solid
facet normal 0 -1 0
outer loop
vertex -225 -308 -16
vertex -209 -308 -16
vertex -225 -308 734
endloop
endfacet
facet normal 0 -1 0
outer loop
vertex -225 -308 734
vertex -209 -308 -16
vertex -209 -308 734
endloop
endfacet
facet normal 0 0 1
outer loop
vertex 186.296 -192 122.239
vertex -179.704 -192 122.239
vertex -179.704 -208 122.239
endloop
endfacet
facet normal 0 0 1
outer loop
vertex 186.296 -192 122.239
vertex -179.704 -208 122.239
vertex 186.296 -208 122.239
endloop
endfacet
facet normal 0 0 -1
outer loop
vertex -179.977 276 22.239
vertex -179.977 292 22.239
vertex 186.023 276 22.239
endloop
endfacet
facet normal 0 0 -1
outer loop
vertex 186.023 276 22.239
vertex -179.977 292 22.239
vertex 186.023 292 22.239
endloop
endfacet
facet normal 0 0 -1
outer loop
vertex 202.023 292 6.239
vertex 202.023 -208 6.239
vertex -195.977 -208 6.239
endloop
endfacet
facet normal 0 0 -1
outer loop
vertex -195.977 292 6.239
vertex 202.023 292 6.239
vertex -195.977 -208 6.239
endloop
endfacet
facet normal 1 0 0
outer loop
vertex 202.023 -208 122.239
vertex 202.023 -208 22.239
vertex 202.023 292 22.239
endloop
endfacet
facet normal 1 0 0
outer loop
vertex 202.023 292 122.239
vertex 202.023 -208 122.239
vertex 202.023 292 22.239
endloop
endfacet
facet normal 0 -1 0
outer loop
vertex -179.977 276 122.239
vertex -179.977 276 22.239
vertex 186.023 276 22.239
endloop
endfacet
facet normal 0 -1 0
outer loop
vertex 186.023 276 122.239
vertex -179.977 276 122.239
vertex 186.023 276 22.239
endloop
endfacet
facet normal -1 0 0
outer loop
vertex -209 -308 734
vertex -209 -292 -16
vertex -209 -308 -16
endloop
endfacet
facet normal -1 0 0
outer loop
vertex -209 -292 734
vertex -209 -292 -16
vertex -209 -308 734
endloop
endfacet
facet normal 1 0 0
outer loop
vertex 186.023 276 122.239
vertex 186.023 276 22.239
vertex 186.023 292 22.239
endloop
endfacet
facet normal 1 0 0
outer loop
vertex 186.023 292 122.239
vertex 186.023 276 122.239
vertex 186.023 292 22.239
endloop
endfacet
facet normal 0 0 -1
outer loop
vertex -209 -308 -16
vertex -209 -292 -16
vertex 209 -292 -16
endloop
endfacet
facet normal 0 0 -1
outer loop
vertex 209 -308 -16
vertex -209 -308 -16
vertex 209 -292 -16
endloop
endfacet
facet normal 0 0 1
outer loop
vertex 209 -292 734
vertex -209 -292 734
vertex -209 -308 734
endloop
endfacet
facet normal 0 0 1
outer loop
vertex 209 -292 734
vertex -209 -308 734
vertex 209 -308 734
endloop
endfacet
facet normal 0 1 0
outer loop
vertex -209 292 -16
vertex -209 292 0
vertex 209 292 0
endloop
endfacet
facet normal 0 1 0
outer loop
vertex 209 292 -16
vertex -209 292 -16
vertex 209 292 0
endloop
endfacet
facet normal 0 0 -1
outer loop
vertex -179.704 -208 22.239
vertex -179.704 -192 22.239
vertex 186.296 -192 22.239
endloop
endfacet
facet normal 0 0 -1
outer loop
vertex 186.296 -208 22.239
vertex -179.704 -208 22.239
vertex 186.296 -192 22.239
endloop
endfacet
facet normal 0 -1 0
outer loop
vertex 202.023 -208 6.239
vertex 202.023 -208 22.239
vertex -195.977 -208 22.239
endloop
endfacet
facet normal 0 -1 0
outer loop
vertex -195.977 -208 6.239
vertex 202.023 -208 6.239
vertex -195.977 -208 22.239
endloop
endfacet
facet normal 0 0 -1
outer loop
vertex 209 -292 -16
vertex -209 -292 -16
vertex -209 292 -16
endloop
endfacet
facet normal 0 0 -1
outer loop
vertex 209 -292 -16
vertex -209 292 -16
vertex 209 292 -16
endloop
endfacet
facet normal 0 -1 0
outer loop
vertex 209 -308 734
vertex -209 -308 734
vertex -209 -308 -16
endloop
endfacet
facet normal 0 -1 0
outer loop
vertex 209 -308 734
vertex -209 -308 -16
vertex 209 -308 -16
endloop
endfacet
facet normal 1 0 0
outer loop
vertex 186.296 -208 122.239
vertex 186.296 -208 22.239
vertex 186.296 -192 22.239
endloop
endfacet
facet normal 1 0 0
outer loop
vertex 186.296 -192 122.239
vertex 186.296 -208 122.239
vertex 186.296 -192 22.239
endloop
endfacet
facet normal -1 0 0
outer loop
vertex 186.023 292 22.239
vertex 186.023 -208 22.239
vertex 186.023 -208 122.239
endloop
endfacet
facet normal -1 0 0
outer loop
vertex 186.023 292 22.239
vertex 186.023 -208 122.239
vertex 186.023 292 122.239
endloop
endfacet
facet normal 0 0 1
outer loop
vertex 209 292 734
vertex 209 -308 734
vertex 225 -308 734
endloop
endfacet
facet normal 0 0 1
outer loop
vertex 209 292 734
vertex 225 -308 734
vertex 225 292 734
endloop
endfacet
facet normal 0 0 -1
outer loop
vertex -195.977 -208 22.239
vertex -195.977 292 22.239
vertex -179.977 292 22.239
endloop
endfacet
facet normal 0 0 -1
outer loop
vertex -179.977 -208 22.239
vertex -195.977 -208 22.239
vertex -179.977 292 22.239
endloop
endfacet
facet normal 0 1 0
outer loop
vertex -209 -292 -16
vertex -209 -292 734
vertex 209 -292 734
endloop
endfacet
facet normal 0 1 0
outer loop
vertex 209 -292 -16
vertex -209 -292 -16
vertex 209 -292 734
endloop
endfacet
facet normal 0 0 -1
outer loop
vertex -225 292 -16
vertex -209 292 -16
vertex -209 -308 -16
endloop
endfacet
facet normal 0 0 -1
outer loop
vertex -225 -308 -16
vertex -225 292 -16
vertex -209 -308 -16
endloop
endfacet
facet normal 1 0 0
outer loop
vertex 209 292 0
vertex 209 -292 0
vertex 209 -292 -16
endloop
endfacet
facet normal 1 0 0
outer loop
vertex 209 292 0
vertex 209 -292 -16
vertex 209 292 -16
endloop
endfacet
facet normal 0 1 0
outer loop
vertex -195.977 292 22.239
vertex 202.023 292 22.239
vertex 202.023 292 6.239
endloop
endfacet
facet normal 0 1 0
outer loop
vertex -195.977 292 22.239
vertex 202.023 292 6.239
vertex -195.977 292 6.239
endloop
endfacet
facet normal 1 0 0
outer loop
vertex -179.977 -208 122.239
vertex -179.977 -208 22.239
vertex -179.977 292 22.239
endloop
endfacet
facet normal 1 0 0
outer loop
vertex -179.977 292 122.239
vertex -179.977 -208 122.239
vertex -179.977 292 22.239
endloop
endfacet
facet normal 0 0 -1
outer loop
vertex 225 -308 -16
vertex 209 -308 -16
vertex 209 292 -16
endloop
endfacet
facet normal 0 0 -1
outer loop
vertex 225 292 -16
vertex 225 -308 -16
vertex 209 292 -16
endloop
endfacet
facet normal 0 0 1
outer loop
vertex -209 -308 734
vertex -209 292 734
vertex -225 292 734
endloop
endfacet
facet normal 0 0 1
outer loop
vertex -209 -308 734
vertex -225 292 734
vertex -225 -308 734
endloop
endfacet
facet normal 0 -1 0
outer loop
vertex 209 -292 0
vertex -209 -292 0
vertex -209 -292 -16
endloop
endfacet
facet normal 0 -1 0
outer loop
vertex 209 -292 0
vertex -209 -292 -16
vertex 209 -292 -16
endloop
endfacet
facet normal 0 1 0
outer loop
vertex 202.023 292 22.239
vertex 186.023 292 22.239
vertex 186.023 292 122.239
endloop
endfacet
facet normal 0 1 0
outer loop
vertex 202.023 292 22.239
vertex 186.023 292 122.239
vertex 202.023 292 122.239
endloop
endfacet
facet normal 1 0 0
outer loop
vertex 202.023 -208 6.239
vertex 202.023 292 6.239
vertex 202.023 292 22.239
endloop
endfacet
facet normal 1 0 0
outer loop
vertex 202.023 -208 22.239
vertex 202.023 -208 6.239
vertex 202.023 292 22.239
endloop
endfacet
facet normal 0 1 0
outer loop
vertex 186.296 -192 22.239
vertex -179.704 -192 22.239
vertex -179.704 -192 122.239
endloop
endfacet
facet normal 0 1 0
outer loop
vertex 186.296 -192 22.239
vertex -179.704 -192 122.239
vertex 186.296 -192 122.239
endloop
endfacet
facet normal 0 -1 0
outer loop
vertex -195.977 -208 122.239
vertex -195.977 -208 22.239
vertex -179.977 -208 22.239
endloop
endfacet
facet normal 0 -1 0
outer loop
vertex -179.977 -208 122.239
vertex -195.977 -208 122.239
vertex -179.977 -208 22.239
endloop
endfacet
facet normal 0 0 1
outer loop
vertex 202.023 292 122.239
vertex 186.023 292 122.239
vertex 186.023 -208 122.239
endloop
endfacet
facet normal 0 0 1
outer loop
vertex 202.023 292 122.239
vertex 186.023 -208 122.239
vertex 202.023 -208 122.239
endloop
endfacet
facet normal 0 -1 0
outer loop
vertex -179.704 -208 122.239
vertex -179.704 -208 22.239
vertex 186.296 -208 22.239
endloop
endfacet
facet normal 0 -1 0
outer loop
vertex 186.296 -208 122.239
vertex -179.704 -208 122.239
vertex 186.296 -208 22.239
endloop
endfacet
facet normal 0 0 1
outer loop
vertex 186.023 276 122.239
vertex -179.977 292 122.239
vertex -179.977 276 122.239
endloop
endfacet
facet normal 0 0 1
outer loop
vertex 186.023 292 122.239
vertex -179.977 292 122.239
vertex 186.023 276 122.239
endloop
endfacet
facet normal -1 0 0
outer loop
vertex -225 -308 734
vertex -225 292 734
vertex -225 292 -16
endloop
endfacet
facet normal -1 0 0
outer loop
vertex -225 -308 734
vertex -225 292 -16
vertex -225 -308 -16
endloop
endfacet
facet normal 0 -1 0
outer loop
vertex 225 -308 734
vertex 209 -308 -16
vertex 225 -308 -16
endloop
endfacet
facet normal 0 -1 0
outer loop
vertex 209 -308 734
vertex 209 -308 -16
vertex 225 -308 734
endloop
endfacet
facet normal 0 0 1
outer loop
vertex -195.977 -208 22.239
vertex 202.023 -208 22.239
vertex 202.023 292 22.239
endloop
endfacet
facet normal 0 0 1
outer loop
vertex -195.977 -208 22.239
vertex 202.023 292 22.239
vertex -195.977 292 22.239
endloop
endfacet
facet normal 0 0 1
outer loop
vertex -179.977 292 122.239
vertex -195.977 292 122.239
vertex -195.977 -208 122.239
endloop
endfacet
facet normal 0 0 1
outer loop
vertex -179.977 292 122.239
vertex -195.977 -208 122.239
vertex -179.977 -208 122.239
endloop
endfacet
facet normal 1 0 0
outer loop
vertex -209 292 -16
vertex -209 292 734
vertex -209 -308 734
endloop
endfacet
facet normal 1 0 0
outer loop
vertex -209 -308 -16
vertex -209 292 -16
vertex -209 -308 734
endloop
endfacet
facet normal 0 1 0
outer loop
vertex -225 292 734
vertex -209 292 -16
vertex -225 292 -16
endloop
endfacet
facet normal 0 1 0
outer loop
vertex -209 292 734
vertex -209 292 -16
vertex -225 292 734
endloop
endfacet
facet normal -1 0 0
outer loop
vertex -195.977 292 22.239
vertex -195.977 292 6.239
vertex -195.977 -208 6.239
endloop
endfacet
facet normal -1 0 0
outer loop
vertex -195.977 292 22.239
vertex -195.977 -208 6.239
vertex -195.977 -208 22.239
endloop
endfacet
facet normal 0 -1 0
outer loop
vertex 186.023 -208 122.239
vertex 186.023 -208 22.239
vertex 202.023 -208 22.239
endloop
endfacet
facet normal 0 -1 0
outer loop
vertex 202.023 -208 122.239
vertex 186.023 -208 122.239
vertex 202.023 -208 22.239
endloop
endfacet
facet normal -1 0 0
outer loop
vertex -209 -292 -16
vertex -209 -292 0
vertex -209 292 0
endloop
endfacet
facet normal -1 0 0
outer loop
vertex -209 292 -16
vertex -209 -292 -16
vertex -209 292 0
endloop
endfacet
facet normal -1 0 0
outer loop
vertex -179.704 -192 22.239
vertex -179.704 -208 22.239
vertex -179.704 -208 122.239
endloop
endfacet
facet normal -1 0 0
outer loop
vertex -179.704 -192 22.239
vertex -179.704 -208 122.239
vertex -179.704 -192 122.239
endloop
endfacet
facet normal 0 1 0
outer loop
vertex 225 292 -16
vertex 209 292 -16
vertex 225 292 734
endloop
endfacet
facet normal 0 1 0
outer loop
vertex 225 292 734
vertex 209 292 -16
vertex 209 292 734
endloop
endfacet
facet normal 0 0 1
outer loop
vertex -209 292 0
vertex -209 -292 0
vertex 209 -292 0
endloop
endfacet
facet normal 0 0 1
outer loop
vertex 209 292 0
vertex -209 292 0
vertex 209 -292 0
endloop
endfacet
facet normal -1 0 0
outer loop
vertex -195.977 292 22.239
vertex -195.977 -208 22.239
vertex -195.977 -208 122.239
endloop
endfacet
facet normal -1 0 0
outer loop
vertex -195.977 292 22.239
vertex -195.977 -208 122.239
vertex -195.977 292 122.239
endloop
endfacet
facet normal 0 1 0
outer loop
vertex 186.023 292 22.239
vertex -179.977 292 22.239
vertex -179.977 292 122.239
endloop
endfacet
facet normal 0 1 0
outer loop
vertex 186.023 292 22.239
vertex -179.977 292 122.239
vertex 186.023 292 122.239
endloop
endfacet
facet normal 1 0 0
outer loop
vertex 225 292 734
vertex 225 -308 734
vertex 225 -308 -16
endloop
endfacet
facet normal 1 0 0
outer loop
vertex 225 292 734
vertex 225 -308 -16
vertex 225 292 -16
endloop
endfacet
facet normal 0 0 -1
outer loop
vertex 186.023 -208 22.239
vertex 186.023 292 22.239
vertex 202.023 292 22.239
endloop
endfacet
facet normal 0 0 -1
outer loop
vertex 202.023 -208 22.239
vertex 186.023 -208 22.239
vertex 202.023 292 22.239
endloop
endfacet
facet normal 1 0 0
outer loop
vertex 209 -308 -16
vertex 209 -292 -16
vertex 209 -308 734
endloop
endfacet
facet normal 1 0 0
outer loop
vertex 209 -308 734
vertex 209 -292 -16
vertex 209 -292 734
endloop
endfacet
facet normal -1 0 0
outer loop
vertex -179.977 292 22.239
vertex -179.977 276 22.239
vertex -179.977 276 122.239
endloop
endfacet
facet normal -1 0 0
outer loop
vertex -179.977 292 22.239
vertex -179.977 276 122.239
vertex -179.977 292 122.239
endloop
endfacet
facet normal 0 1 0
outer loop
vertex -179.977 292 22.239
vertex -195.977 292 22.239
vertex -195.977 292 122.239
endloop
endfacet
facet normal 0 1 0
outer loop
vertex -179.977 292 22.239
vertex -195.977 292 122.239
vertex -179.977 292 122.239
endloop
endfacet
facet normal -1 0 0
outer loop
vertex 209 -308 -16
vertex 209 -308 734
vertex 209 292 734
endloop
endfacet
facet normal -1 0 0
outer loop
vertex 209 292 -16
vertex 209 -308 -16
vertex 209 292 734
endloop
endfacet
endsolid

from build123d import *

# Parameters (mm, degrees)
F0_W      = 418
F0_H      = 584
F1_DEPTH  = 16
F2_W      = 418
F2_H      = 750
F3_DEPTH  = 16
F4_W      = 600
F4_H      = 750
F5_DEPTH  = 16
F6_W      = 600
F6_H      = 750
F7_DEPTH  = 16
F8_W      = 398
F8_H      = 16
F9_DEPTH  = 500
F10_W     = 16
F10_H     = 500
F11_DEPTH = 100
F12_W     = 16
F12_H     = 500
F13_DEPTH = 100
F14_W     = 366
F14_H     = 16
F15_DEPTH = 100
F16_W     = 366
F16_H     = 16
F17_DEPTH = 100


with BuildPart() as f1:
    # F0 (on Top) → F1 (new body)
    with BuildSketch(Plane.XY):
        Rectangle(F0_W, F0_H)
    extrude(amount=-F1_DEPTH)


with BuildPart() as f3:
    # F2 (on face) → F3 (new body)
    with BuildSketch(Plane.XZ.offset(292)):
        with Locations((0, 359)):
            Rectangle(F2_W, F2_H)
    extrude(amount=F3_DEPTH)


with BuildPart() as f5:
    # F4 (on face) → F5 (new body)
    with BuildSketch(Plane.YZ.offset(209)):
        with Locations((-8, 359)):
            Rectangle(F4_W, F4_H)
    extrude(amount=F5_DEPTH)


with BuildPart() as f7:
    # F6 (on face) → F7 (new body)
    with BuildSketch(Plane(origin=(-209, 0, 0), x_dir=(0, -1, 0), z_dir=(-1, 0, 0))):
        with Locations((8, 359)):
            Rectangle(F6_W, F6_H)
    extrude(amount=F7_DEPTH)


with BuildPart() as f9:
    # F8 (on face) → F9 (new body)
    with BuildSketch(Plane(origin=(0, 292, 0), x_dir=(-1, 0, 0), z_dir=(0, 1, 0))):
        with Locations((-3.023104, 14.239265)):
            Rectangle(F8_W, F8_H)
    extrude(amount=-F9_DEPTH)


with BuildPart() as f11:
    # F10 (on face) → F11 (new body)
    with BuildSketch(Plane.XY.offset(22.239265)):
        with Locations((194.023104, 42)):
            Rectangle(F10_W, F10_H)
    extrude(amount=F11_DEPTH)


with BuildPart() as f13:
    # F12 (on face) → F13 (new body)
    with BuildSketch(Plane.XY.offset(22.239265)):
        with Locations((-187.976896, 42)):
            Rectangle(F12_W, F12_H)
    extrude(amount=F13_DEPTH)


with BuildPart() as f15:
    # F14 (on face) → F15 (new body)
    with BuildSketch(Plane.XY.offset(22.239265)):
        with Locations((3.296288, -200)):
            Rectangle(F14_W, F14_H)
    extrude(amount=F15_DEPTH)


with BuildPart() as f17:
    # F16 (on face) → F17 (new body)
    with BuildSketch(Plane.XY.offset(22.239265)):
        with Locations((3.023104, 284)):
            Rectangle(F16_W, F16_H)
    extrude(amount=F17_DEPTH)


solid = Compound([f1.part, f3.part, f5.part, f7.part, f9.part, f11.part, f13.part, f15.part, f17.part])
